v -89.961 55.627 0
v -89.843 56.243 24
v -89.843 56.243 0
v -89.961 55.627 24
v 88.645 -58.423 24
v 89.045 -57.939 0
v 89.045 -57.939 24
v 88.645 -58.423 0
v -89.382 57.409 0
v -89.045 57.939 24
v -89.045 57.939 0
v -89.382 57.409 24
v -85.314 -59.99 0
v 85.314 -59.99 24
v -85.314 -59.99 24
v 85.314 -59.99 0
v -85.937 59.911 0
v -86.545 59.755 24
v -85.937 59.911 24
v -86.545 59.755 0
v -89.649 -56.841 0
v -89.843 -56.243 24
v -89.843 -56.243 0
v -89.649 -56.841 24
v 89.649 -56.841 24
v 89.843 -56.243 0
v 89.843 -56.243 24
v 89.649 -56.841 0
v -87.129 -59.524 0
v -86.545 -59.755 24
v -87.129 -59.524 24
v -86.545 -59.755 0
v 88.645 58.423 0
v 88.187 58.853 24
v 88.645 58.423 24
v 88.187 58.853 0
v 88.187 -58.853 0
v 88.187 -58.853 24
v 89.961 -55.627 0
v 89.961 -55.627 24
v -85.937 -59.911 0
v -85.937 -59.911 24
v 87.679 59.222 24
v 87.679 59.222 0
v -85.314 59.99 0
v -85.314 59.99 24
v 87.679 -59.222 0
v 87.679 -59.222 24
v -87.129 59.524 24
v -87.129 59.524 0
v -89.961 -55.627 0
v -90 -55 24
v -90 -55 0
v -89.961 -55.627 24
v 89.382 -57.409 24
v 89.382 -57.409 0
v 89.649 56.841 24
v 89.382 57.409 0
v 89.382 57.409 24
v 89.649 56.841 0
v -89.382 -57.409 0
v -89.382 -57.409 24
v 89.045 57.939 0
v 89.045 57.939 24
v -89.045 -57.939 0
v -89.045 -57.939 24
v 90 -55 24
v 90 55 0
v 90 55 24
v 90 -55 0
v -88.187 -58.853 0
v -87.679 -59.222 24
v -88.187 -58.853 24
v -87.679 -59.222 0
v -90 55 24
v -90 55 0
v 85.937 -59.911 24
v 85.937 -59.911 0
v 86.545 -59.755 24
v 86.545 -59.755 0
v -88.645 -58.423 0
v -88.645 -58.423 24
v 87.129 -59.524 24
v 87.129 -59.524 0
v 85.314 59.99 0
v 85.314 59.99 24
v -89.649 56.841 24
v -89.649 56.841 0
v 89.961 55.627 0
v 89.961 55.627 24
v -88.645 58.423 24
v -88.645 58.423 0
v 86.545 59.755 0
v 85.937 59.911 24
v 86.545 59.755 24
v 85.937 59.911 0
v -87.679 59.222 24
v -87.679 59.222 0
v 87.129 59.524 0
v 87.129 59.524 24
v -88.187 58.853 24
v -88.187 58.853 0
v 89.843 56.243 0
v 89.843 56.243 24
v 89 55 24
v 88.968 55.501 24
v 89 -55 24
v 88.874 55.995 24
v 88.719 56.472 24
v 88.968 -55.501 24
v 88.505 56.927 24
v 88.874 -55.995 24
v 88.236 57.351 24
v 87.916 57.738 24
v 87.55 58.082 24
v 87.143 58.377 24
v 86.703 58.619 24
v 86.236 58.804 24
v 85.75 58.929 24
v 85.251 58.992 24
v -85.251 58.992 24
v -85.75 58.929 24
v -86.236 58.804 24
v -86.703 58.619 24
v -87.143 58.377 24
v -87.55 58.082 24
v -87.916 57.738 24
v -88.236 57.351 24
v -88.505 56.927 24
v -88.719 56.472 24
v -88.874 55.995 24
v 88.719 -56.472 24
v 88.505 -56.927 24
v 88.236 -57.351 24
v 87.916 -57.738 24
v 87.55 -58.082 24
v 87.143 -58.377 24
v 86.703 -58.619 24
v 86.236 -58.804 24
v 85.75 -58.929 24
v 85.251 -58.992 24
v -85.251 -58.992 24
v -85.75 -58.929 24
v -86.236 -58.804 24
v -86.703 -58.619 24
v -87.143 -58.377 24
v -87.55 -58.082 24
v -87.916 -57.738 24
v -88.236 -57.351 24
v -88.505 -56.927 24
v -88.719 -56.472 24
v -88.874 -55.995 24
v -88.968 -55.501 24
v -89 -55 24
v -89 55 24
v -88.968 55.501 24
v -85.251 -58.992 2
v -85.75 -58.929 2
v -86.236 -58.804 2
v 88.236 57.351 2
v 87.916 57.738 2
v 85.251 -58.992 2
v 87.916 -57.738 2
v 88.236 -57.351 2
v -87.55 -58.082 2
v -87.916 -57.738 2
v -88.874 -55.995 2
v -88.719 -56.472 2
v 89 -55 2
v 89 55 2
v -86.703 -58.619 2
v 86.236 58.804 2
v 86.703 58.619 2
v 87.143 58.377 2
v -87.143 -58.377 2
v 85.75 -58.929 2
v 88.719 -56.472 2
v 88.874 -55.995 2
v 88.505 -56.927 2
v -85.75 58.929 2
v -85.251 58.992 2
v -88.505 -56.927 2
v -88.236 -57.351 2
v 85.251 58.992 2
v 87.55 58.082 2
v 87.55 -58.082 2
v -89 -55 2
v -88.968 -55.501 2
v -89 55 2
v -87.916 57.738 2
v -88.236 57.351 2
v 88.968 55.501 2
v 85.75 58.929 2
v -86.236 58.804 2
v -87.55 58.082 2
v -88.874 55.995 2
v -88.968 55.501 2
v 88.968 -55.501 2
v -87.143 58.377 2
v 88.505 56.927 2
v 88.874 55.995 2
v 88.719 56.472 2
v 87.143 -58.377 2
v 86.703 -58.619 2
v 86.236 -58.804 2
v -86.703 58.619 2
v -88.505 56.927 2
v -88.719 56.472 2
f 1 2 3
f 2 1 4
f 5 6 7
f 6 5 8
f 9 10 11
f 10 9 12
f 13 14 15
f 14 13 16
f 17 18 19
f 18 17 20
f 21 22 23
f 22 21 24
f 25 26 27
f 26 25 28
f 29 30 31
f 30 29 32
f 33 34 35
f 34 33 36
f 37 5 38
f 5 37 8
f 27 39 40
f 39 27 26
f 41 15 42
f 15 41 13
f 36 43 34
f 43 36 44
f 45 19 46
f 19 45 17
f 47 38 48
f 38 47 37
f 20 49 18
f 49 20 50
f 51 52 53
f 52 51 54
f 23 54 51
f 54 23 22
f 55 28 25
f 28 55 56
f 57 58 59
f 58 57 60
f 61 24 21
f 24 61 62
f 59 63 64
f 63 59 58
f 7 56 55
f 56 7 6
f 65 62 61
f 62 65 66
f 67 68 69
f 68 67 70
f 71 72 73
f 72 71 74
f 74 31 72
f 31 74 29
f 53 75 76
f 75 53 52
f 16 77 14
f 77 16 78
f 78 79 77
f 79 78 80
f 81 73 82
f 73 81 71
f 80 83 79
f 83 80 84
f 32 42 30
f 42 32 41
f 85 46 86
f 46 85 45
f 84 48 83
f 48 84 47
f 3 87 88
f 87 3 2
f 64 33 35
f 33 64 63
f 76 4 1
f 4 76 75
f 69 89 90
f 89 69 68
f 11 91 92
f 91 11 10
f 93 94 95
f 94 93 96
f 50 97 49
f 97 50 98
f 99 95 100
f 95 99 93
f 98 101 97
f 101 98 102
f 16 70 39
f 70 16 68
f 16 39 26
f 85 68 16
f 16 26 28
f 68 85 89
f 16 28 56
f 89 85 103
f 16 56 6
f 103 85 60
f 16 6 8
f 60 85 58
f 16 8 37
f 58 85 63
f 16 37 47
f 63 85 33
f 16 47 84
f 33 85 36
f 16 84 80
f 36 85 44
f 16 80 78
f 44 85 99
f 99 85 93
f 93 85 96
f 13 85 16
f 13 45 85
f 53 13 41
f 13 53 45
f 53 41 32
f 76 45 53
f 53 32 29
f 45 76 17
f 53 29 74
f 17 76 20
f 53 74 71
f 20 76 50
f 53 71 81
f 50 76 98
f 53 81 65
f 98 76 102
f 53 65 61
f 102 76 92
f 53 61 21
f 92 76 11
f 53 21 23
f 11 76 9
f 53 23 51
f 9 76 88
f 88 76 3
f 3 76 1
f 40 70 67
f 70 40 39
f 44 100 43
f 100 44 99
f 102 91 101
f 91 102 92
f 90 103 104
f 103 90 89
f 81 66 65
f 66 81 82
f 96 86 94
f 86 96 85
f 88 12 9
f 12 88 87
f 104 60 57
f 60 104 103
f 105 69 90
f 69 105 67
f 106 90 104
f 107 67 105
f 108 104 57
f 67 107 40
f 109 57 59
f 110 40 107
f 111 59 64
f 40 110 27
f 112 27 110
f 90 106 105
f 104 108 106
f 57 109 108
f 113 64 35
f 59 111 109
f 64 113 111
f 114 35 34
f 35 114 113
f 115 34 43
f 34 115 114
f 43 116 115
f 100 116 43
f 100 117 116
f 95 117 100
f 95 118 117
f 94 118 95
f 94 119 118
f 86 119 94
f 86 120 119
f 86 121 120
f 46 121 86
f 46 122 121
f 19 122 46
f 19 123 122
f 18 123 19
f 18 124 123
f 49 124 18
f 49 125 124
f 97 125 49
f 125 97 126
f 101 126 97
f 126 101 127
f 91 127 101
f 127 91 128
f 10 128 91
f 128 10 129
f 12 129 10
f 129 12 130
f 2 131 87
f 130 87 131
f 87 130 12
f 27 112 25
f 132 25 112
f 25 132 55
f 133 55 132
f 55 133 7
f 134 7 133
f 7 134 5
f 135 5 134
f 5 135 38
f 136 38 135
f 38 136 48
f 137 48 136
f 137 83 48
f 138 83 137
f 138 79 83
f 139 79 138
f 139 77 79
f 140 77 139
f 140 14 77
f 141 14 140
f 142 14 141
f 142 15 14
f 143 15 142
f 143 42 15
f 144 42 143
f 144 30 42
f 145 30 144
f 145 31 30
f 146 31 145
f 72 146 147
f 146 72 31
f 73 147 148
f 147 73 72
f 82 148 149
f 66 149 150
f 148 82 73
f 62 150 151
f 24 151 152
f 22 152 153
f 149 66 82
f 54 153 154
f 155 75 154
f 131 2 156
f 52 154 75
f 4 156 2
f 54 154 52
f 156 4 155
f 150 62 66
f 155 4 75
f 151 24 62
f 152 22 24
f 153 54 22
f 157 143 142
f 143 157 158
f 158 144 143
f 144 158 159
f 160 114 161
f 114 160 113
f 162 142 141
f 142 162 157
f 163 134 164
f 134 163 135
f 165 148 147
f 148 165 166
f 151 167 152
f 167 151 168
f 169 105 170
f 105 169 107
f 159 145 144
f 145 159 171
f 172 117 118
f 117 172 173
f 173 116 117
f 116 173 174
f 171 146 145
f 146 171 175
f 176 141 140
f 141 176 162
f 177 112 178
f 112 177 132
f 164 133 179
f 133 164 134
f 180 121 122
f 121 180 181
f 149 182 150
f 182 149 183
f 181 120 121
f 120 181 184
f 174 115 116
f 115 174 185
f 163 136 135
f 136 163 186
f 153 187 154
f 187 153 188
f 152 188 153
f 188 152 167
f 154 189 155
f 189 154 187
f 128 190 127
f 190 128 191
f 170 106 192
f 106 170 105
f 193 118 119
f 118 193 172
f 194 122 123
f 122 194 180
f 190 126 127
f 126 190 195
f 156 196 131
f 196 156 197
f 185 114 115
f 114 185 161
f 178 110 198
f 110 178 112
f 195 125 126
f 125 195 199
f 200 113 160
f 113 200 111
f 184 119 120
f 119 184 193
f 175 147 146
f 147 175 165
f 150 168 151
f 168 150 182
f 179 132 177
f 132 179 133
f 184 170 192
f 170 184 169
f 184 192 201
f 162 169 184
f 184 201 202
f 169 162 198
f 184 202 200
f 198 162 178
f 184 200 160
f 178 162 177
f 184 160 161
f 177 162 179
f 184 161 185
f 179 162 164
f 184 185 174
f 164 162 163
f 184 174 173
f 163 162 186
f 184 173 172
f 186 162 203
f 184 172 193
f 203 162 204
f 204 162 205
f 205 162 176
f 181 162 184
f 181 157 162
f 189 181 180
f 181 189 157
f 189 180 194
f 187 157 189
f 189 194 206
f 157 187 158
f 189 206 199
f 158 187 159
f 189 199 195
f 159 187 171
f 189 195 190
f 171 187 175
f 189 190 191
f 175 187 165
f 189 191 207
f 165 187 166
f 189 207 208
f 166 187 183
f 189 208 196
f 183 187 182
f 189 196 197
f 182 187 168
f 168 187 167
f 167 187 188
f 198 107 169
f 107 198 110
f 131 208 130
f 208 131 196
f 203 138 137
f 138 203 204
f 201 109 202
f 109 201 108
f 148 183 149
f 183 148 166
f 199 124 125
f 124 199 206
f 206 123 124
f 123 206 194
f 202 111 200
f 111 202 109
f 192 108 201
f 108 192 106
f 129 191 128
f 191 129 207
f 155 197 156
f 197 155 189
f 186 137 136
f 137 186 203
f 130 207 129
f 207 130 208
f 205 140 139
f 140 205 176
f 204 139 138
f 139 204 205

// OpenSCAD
$fn = 50;


difference() {
	union() {
		hull() {
			translate(v = [-85.0000000000, 55.0000000000, 0]) {
				cylinder(h = 24, r = 5);
			}
			translate(v = [85.0000000000, 55.0000000000, 0]) {
				cylinder(h = 24, r = 5);
			}
			translate(v = [-85.0000000000, -55.0000000000, 0]) {
				cylinder(h = 24, r = 5);
			}
			translate(v = [85.0000000000, -55.0000000000, 0]) {
				cylinder(h = 24, r = 5);
			}
		}
	}
	union() {
		translate(v = [0, 0, 2]) {
			hull() {
				translate(v = [-85.0000000000, 55.0000000000, 0]) {
					cylinder(h = 22, r = 4);
				}
				translate(v = [85.0000000000, 55.0000000000, 0]) {
					cylinder(h = 22, r = 4);
				}
				translate(v = [-85.0000000000, -55.0000000000, 0]) {
					cylinder(h = 22, r = 4);
				}
				translate(v = [85.0000000000, -55.0000000000, 0]) {
					cylinder(h = 22, r = 4);
				}
			}
		}
	}
}
